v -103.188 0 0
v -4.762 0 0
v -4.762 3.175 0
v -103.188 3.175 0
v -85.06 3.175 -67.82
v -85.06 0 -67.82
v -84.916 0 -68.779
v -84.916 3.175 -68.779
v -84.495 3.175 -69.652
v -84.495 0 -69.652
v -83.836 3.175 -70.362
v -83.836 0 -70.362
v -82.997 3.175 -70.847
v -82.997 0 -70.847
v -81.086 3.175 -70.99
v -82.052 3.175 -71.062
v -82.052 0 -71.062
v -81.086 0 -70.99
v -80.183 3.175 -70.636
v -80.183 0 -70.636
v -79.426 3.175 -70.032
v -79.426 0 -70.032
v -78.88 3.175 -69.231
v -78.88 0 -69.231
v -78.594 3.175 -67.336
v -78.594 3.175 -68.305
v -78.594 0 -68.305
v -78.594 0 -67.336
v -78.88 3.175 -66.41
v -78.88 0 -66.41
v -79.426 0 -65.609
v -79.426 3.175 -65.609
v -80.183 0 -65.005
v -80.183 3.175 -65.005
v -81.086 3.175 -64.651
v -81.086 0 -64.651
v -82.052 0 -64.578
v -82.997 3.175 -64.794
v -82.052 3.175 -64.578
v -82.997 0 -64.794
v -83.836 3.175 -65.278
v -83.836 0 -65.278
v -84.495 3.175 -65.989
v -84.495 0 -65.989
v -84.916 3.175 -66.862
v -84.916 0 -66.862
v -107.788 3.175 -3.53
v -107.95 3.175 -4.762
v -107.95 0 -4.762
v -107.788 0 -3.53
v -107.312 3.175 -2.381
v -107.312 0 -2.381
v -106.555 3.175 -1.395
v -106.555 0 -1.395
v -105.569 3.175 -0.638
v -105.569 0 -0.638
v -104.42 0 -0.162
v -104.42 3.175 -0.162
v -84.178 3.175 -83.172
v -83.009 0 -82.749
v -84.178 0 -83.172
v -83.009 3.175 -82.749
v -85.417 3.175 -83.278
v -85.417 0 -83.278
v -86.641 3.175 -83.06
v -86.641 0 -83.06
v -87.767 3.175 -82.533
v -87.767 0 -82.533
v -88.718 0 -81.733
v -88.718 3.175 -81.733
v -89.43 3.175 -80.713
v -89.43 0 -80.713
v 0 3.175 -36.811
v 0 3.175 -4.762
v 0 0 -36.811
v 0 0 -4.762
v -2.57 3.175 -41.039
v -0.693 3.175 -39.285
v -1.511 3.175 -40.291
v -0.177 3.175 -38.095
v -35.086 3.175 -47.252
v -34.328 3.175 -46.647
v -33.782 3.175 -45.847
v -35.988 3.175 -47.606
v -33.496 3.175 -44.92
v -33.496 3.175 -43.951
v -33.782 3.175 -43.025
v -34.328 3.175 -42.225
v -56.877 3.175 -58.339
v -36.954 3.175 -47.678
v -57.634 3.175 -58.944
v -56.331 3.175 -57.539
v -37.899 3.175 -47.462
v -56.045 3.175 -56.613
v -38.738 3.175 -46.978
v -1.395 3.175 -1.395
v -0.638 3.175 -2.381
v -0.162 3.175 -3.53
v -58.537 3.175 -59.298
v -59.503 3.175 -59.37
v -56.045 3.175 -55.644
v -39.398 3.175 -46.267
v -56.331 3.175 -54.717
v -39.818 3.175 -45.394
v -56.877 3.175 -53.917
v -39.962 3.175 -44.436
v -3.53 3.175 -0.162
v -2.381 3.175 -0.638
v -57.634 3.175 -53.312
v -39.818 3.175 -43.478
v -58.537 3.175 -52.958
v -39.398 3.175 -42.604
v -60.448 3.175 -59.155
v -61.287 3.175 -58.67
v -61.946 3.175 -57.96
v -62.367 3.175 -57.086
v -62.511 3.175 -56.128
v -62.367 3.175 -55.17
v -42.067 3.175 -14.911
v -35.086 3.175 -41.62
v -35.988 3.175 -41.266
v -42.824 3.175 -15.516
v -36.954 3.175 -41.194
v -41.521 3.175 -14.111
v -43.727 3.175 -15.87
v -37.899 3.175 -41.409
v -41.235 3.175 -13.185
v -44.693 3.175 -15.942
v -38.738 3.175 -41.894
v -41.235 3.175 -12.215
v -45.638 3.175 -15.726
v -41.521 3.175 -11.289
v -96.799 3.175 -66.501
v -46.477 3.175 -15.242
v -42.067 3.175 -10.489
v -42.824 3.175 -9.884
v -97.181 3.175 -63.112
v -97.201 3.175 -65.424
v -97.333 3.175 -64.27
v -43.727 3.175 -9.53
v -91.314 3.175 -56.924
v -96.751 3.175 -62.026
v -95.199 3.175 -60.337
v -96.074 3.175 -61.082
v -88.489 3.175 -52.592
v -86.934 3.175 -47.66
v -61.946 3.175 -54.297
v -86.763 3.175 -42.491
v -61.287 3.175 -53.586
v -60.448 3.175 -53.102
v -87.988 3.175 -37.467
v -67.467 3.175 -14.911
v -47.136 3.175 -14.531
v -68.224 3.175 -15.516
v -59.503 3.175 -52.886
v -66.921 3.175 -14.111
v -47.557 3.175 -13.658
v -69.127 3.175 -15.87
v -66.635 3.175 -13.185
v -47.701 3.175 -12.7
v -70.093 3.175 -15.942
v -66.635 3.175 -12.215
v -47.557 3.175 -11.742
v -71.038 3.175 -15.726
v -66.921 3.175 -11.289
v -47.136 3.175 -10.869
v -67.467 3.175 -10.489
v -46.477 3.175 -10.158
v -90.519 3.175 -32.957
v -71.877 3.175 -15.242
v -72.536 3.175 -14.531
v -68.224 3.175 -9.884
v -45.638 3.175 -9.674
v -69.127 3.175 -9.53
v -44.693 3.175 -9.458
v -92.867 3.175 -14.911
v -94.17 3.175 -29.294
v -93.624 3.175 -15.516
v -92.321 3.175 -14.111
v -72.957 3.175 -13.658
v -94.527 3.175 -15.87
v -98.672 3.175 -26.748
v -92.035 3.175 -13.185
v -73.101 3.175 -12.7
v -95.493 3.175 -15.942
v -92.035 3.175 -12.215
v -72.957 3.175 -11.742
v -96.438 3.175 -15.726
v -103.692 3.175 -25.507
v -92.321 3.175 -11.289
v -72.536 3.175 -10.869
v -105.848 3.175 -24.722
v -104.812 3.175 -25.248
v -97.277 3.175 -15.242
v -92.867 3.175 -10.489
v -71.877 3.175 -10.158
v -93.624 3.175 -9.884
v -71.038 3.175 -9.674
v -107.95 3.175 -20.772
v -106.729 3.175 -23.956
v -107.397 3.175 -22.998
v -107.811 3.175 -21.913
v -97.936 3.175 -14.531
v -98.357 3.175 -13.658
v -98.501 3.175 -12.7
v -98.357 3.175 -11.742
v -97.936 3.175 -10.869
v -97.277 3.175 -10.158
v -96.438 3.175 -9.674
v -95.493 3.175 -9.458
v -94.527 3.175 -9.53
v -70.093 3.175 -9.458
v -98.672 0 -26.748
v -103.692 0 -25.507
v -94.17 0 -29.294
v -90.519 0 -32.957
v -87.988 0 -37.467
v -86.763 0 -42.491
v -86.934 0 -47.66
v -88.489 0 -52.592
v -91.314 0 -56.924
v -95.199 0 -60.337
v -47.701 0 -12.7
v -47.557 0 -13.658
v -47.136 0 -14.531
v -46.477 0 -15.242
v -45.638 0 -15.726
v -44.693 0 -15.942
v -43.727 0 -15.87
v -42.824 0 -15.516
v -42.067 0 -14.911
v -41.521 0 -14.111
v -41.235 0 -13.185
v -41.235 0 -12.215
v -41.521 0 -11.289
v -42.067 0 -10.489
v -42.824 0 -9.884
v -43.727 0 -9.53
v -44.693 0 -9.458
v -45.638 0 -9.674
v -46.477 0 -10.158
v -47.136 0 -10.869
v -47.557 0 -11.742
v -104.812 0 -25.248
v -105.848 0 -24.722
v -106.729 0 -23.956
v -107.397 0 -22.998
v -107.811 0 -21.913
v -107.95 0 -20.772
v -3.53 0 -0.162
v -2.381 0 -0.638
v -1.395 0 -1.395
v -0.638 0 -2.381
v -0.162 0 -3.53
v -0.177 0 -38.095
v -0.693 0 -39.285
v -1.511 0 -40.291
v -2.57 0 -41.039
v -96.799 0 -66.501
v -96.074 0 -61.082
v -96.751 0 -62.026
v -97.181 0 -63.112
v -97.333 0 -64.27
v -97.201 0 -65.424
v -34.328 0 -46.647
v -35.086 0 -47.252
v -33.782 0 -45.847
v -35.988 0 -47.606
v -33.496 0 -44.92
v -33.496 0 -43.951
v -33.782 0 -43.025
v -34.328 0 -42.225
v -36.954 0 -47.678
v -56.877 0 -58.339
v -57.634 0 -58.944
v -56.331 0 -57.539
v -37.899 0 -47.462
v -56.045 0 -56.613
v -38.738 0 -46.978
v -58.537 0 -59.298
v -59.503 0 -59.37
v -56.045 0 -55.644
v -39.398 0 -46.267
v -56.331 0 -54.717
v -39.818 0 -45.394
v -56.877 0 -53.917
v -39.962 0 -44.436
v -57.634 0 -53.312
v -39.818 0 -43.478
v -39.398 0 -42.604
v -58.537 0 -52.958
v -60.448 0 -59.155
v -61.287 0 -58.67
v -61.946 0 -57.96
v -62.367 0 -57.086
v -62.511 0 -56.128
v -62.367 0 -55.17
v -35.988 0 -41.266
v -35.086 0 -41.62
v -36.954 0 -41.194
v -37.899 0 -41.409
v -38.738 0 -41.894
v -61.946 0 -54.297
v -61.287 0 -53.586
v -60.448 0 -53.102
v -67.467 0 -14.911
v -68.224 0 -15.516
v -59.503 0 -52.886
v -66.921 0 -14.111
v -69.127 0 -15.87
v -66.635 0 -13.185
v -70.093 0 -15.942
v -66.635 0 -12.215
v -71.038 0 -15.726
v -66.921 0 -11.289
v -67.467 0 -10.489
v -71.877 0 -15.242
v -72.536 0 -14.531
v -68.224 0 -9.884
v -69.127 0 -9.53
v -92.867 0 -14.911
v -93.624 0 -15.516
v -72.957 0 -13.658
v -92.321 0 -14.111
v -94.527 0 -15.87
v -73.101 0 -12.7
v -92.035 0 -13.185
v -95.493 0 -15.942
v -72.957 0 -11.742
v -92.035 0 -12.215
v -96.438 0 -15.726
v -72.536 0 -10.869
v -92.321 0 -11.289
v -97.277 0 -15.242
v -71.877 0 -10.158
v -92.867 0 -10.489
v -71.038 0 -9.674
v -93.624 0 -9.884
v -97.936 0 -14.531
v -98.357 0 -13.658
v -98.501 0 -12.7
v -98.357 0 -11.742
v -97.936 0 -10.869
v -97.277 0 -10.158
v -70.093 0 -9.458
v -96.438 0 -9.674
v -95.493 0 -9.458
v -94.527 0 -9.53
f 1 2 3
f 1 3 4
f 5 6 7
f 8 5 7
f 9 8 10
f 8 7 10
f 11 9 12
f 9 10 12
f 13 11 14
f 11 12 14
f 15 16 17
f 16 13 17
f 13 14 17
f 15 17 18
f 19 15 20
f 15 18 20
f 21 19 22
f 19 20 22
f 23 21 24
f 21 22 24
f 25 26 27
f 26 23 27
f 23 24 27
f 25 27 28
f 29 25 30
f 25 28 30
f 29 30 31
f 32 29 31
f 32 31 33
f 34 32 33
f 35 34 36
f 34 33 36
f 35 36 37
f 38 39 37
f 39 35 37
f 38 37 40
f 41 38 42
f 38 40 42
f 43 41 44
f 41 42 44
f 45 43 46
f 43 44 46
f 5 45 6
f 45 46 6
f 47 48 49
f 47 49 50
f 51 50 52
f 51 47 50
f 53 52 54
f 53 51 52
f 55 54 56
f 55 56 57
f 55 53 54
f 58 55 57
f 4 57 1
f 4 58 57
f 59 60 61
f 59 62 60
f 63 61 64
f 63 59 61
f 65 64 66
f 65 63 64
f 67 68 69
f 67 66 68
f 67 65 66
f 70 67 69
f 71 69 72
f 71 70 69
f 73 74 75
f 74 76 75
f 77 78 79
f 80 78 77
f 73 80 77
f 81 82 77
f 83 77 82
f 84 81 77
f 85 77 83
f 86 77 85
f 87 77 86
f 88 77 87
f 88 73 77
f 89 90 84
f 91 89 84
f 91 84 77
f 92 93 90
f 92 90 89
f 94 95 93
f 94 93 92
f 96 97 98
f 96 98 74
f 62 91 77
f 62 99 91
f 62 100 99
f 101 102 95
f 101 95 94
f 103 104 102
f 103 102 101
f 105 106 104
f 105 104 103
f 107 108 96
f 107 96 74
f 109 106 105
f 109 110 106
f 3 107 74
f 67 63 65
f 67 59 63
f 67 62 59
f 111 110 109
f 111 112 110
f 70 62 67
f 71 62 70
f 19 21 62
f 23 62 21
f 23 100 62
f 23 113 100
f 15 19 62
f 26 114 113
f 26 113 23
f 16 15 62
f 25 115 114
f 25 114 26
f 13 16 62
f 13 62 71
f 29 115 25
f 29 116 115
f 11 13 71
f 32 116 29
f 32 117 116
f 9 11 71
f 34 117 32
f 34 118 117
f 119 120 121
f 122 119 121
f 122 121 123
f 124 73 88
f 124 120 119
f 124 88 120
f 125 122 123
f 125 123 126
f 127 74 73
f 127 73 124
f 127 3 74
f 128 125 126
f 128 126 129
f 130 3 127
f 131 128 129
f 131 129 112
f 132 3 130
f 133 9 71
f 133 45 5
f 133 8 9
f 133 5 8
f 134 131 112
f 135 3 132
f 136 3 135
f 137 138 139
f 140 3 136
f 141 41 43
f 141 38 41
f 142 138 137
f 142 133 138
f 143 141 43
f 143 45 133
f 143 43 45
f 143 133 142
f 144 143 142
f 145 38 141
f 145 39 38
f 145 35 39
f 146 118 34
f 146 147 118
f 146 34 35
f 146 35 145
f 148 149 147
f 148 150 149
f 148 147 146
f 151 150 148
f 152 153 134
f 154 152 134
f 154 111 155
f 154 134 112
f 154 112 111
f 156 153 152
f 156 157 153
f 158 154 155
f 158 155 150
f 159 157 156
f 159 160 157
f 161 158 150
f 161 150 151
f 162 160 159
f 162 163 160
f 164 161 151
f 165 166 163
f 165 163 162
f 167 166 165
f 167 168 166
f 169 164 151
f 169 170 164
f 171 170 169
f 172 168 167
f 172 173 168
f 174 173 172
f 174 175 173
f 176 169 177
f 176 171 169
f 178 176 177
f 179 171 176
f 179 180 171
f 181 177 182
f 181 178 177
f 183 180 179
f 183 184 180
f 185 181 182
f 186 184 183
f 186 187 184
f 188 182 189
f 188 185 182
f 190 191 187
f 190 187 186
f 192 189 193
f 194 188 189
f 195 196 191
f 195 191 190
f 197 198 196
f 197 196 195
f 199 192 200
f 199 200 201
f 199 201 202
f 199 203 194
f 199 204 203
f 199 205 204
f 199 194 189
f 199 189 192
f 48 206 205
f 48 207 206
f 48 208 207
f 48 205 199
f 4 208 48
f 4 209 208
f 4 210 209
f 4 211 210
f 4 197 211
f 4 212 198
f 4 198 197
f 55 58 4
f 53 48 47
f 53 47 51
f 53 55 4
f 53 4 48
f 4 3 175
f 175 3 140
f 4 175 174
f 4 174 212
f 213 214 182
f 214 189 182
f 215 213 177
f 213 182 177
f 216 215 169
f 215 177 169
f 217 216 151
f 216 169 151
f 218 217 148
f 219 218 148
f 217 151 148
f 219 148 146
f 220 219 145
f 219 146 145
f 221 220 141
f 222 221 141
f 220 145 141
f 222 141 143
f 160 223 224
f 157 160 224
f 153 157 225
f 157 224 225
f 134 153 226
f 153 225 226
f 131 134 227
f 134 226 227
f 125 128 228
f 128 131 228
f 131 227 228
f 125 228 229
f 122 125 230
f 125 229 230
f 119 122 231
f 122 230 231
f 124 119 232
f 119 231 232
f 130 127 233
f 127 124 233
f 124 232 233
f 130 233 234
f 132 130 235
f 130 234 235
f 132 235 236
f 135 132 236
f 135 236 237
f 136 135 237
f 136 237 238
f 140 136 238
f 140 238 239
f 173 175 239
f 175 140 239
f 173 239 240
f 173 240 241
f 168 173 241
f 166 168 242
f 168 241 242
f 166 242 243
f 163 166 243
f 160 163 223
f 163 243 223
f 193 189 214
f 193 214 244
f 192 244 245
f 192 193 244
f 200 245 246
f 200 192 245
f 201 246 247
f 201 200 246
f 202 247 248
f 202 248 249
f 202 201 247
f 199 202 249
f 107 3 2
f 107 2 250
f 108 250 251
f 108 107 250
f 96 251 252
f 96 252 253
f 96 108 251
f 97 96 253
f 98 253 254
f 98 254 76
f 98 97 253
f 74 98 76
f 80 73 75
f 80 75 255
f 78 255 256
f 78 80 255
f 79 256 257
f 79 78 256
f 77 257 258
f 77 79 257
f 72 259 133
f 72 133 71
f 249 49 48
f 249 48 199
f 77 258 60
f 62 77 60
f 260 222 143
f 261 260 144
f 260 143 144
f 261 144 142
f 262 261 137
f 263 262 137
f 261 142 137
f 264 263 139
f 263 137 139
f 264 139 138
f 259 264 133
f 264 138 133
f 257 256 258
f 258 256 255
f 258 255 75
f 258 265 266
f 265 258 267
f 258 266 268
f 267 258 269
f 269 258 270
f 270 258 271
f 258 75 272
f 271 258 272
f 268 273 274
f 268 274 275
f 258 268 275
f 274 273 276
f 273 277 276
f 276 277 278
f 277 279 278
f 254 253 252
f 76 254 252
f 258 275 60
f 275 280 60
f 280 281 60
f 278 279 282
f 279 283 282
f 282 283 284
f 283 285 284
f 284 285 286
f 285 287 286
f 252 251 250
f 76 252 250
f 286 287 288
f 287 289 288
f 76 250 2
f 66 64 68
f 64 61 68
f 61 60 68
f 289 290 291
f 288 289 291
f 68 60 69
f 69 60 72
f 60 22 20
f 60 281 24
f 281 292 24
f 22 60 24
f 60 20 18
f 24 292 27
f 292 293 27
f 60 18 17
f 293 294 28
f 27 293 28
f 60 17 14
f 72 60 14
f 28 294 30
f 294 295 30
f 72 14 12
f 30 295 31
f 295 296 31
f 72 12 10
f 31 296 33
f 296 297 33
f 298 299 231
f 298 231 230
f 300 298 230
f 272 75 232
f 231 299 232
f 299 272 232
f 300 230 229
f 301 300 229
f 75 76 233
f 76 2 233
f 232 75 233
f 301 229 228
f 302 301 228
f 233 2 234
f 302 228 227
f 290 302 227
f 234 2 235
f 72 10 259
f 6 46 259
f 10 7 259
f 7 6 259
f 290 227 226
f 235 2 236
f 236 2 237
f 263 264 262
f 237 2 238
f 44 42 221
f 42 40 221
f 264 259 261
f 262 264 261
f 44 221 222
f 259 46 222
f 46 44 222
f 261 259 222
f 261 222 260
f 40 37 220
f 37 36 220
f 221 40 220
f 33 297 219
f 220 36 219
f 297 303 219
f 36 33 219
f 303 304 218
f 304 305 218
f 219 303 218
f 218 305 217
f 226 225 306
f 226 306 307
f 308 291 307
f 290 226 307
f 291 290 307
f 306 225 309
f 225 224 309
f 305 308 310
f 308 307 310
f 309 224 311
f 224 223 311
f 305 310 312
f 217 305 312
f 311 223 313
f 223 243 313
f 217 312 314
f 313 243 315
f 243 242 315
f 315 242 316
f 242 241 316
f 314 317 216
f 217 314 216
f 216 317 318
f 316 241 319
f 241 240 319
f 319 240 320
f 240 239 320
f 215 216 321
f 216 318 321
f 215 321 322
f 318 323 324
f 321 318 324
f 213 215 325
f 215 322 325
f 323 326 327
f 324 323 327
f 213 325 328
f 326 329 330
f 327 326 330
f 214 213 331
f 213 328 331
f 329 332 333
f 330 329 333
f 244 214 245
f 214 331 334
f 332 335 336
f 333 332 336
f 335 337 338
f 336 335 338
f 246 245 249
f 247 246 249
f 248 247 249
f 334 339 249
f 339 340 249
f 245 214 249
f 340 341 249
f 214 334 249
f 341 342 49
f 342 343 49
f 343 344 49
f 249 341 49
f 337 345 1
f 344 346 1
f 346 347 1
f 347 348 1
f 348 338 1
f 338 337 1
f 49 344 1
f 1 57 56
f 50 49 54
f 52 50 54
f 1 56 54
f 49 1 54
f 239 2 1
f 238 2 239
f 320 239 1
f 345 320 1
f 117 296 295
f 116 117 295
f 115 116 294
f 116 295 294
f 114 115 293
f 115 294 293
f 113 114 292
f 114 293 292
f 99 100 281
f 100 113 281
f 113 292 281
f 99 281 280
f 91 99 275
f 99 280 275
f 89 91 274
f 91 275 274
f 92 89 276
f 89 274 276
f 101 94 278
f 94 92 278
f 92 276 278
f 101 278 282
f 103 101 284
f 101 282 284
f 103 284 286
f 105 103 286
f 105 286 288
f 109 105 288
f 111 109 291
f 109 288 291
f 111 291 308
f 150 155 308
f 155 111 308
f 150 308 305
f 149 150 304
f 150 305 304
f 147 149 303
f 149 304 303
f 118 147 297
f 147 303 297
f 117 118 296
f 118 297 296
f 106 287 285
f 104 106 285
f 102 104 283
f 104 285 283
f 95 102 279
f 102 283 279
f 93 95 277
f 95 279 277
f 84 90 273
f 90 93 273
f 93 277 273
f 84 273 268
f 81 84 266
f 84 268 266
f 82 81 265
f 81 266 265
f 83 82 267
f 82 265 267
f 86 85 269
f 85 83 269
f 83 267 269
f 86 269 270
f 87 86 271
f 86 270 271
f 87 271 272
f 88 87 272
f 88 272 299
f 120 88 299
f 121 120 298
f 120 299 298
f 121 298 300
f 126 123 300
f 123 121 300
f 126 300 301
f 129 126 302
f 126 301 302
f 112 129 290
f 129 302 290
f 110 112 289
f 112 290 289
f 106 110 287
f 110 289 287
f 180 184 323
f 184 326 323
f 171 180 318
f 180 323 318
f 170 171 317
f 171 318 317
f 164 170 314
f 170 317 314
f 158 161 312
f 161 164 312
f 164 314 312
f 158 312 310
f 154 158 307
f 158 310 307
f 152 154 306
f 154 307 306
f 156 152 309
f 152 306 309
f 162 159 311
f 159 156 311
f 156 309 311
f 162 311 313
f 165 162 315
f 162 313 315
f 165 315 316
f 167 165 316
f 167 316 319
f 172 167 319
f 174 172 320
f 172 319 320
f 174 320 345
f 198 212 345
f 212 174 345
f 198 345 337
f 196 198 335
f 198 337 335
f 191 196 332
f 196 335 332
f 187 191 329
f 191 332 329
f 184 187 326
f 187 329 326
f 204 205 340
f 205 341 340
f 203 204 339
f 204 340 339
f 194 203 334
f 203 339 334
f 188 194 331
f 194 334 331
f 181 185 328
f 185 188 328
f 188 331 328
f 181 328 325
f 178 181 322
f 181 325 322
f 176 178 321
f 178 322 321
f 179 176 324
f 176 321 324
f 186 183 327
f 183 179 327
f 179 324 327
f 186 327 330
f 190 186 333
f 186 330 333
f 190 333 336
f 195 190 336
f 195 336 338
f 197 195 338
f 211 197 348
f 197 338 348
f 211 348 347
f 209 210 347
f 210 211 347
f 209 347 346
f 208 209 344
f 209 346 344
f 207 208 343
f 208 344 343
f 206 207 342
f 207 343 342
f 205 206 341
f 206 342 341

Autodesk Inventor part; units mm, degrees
ref_plane "YZ Plane" through (0, 0, 0) normal (1, 0, 0) x (0, 1, 0)
ref_plane "XZ Plane" through (0, 0, 0) normal (0, 1, 0) x (-1, 0, 0)
ref_plane "XY Plane" through (0, 0, 0) normal (0, 0, 1) x (1, 0, 0)
sketch "Sketch1" plane through (0, 0, 0) normal (0, 1, 0) x (-1, 0, 0)
  line L0 (0, 0) -> (0, -39.7058)
  line L1 (0, 0) -> (107.95, 0)
  line L2 (107.95, 0) -> (107.95, -25.4)
  line L3 (107.95, -25.4) -> (27.5892, -25.4)
  line L4 (0, -39.7058) -> (87.2373, -84.9409)
  line L5 (0, -3.175) -> (38.1, -3.175) construction
  line L6 (38.1, -3.175) -> (38.1, -22.225) construction
  line L7 (38.1, -22.225) -> (0, -22.225) construction
  line L8 (0, -22.225) -> (0, -3.175) construction
  circle A0 centre (44.45, -12.7) radius 3.2512
  circle A1 centre (69.85, -12.7) radius 3.2512
  circle A2 centre (95.25, -12.7) radius 3.2512
  line L9 (27.5892, -25.4) -> (0, -18.6724) construction
  circle A3 centre (36.7113, -44.4359) radius 3.2512
  circle A4 centre (59.2601, -56.1281) radius 3.2512
  circle A5 centre (81.809, -67.8203) radius 3.2512
  line L10 (27.5892, -25.4) -> (98.9296, -62.392)
  line L11 (81.809, -67.8203) -> (93.0834, -73.6665) construction
  line L12 (98.9296, -62.392) -> (87.2373, -84.9409)
  point P0 (38.1, -12.7)
  dimension "d0" = 39.7058
  dimension "d1" = 25.4
  dimension "d2" = 27.5892
  dimension "d4" = 107.95
  dimension "d5" = 19.05
  dimension "d6" = 3.175
  dimension "d7" = 38.1
  dimension "d8" = 6.5024
  dimension "d9" = 6.35
  dimension "d10" = 25.4
  dimension "d11" = 25.4
  dimension "d14" = 62.592
  dimension "d15" = 12.7
  dimension "d16" = 27.408
  dimension "d17" = 166.296
extrude "Extrusion1" add sketch "Sketch1" along normal blind 3.175
fillet "Fillet1" radius 19.05 1 edges at (-27.5892, 1.5875, -25.4)
fillet "Fillet2" radius 4.7625 6 edges at (-107.95, 1.5875, 0) (-107.95, 1.5875, -25.4) (-98.9296, 1.5875, -62.392) (-87.2373, 1.5875, -84.9409) (0, 1.5875, 0) (0, 1.5875, -39.7058)
properties part number "STRU_018_AngleBracket_62" material "Aluminum 6061"
